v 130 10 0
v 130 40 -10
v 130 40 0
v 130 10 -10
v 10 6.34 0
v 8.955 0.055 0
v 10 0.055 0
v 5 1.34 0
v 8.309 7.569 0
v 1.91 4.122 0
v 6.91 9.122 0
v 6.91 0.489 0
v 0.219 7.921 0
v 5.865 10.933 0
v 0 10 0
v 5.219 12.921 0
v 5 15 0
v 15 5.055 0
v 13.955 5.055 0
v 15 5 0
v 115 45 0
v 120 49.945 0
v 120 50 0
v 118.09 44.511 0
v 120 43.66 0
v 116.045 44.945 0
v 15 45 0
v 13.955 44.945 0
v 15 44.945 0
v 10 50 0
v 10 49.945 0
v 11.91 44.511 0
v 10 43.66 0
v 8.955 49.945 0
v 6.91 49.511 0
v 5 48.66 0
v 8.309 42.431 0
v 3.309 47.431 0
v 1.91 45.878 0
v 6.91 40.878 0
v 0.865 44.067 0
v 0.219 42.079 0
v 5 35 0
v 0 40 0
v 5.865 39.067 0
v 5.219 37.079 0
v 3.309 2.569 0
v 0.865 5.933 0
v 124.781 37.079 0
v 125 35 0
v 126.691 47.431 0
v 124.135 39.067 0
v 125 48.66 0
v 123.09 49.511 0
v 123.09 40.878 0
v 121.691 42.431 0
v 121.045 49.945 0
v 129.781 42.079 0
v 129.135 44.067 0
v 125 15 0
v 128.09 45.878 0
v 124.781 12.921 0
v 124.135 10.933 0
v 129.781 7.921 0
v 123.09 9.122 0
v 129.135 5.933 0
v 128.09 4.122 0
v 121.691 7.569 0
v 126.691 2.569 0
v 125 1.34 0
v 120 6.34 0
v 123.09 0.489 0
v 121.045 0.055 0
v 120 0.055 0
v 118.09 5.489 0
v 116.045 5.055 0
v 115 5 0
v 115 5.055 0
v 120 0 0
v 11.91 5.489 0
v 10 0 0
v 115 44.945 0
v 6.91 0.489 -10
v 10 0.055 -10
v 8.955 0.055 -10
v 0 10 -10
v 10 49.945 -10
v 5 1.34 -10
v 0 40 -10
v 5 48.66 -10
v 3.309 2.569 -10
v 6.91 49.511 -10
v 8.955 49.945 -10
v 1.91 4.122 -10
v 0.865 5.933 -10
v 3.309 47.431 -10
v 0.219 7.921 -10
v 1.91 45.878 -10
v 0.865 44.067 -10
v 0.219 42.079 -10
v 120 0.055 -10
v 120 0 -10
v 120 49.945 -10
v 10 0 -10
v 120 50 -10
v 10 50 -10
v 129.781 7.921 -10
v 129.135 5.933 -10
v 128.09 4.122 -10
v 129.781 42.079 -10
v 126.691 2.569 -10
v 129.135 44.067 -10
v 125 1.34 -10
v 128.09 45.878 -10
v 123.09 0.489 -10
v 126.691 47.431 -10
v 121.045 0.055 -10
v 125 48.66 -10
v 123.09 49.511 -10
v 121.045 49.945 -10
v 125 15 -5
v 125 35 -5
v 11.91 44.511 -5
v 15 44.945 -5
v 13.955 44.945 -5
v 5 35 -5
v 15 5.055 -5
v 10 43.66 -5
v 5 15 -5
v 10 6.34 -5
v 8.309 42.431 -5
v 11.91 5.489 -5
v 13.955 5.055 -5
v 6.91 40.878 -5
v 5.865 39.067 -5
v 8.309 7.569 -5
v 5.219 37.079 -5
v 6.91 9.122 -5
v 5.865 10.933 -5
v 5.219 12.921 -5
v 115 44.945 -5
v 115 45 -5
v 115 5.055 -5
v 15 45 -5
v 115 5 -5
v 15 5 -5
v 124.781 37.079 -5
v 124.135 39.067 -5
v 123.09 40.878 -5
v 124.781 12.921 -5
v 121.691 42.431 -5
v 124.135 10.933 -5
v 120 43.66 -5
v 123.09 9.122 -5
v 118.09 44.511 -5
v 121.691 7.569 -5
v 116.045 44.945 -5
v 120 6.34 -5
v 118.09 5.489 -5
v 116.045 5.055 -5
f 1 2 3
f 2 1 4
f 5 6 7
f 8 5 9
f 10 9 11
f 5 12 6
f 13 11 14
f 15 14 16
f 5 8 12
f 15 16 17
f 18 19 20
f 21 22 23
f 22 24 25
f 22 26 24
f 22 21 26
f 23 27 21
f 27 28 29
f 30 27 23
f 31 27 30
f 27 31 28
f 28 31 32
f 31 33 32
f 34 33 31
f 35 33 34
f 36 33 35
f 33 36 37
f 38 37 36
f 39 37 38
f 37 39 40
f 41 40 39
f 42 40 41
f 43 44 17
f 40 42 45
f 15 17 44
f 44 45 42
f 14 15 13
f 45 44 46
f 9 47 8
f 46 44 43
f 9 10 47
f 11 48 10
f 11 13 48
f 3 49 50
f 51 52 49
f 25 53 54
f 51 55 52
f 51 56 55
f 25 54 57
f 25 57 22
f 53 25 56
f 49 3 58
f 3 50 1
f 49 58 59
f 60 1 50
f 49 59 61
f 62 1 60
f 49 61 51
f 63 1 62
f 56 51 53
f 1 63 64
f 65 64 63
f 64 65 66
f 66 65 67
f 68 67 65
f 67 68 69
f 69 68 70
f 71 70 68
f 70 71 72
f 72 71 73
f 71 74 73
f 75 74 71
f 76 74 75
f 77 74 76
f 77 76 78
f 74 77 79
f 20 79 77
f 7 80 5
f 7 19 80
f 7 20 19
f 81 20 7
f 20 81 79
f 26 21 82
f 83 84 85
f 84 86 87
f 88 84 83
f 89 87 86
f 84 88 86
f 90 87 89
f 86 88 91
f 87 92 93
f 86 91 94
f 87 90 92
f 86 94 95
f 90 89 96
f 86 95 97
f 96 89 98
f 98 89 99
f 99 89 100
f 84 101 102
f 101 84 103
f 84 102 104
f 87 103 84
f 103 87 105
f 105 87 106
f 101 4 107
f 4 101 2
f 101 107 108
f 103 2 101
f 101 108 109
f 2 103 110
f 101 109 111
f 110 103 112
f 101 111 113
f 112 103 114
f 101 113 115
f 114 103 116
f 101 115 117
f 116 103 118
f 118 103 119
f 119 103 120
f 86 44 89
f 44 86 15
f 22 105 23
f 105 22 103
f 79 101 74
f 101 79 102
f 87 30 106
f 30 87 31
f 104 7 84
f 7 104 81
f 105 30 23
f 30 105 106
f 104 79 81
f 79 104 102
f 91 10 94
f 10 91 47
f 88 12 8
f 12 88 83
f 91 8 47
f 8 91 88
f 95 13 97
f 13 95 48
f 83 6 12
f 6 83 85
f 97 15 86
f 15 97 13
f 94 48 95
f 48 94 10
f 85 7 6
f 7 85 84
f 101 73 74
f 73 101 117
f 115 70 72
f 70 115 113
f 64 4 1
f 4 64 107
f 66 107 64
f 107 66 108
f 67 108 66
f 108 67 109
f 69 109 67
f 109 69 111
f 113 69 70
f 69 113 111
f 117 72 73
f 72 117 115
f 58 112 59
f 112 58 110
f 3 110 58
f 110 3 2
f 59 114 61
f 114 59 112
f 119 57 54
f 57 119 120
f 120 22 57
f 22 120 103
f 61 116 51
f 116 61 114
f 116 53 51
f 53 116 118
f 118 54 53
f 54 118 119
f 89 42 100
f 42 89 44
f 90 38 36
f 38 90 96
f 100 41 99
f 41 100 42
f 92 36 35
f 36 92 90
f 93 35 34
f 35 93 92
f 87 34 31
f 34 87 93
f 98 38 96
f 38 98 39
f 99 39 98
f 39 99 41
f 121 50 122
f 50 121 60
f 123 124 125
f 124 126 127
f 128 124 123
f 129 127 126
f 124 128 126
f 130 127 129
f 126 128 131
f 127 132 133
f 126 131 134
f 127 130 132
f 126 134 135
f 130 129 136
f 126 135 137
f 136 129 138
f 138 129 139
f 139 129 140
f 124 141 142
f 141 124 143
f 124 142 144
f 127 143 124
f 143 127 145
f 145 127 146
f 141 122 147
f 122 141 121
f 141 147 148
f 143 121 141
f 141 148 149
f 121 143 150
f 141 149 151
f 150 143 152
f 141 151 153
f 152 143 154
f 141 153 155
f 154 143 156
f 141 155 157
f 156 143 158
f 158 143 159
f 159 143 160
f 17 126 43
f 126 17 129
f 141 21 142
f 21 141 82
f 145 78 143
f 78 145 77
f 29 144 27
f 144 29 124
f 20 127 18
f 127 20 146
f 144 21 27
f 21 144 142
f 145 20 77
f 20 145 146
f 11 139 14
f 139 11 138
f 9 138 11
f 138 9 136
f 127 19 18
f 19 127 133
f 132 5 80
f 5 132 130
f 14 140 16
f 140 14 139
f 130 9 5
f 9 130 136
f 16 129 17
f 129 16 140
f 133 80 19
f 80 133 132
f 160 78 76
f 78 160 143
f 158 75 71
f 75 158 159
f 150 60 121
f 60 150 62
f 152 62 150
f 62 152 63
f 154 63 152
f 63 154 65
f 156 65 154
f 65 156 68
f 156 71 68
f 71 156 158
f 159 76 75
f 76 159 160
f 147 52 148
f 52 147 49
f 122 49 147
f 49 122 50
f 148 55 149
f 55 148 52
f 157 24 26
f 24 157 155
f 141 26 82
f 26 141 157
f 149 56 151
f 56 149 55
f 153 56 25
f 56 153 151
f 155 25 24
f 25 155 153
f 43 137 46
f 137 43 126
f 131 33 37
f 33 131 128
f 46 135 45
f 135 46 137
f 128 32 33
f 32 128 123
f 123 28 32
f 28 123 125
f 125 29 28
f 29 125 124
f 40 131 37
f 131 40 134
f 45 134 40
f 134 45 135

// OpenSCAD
// Combine the PyCAM logo with a slightly depressed rounded-cornered box.

module block(a, b, height, radius) {
	translate([radius, radius, 0]) union() {
		translate([-radius, 0, 0]) cube([a, b - 2 * radius, height]);
		translate([0, -radius, 0]) cube([a - 2 * radius, b, height]);
		cylinder(r=radius, h=height);
		translate([a - 2 * radius, 0, 0]) cylinder(r=radius, h=height);
		translate([a - 2 * radius, b - 2 * radius, 0]) cylinder(r=radius, h=height);
		translate([0, b - 2 * radius, 0]) cylinder(r=radius, h=height);
	}
}

translate([0, 0, -10]) difference() {
	block(130, 50, 10, 10);
	translate([5, 5, 5]) block(120, 40, 6, 10);
}
translate([15, 17, -5.05]) linear_extrude(file="camelot-text.dxf", height=3);
